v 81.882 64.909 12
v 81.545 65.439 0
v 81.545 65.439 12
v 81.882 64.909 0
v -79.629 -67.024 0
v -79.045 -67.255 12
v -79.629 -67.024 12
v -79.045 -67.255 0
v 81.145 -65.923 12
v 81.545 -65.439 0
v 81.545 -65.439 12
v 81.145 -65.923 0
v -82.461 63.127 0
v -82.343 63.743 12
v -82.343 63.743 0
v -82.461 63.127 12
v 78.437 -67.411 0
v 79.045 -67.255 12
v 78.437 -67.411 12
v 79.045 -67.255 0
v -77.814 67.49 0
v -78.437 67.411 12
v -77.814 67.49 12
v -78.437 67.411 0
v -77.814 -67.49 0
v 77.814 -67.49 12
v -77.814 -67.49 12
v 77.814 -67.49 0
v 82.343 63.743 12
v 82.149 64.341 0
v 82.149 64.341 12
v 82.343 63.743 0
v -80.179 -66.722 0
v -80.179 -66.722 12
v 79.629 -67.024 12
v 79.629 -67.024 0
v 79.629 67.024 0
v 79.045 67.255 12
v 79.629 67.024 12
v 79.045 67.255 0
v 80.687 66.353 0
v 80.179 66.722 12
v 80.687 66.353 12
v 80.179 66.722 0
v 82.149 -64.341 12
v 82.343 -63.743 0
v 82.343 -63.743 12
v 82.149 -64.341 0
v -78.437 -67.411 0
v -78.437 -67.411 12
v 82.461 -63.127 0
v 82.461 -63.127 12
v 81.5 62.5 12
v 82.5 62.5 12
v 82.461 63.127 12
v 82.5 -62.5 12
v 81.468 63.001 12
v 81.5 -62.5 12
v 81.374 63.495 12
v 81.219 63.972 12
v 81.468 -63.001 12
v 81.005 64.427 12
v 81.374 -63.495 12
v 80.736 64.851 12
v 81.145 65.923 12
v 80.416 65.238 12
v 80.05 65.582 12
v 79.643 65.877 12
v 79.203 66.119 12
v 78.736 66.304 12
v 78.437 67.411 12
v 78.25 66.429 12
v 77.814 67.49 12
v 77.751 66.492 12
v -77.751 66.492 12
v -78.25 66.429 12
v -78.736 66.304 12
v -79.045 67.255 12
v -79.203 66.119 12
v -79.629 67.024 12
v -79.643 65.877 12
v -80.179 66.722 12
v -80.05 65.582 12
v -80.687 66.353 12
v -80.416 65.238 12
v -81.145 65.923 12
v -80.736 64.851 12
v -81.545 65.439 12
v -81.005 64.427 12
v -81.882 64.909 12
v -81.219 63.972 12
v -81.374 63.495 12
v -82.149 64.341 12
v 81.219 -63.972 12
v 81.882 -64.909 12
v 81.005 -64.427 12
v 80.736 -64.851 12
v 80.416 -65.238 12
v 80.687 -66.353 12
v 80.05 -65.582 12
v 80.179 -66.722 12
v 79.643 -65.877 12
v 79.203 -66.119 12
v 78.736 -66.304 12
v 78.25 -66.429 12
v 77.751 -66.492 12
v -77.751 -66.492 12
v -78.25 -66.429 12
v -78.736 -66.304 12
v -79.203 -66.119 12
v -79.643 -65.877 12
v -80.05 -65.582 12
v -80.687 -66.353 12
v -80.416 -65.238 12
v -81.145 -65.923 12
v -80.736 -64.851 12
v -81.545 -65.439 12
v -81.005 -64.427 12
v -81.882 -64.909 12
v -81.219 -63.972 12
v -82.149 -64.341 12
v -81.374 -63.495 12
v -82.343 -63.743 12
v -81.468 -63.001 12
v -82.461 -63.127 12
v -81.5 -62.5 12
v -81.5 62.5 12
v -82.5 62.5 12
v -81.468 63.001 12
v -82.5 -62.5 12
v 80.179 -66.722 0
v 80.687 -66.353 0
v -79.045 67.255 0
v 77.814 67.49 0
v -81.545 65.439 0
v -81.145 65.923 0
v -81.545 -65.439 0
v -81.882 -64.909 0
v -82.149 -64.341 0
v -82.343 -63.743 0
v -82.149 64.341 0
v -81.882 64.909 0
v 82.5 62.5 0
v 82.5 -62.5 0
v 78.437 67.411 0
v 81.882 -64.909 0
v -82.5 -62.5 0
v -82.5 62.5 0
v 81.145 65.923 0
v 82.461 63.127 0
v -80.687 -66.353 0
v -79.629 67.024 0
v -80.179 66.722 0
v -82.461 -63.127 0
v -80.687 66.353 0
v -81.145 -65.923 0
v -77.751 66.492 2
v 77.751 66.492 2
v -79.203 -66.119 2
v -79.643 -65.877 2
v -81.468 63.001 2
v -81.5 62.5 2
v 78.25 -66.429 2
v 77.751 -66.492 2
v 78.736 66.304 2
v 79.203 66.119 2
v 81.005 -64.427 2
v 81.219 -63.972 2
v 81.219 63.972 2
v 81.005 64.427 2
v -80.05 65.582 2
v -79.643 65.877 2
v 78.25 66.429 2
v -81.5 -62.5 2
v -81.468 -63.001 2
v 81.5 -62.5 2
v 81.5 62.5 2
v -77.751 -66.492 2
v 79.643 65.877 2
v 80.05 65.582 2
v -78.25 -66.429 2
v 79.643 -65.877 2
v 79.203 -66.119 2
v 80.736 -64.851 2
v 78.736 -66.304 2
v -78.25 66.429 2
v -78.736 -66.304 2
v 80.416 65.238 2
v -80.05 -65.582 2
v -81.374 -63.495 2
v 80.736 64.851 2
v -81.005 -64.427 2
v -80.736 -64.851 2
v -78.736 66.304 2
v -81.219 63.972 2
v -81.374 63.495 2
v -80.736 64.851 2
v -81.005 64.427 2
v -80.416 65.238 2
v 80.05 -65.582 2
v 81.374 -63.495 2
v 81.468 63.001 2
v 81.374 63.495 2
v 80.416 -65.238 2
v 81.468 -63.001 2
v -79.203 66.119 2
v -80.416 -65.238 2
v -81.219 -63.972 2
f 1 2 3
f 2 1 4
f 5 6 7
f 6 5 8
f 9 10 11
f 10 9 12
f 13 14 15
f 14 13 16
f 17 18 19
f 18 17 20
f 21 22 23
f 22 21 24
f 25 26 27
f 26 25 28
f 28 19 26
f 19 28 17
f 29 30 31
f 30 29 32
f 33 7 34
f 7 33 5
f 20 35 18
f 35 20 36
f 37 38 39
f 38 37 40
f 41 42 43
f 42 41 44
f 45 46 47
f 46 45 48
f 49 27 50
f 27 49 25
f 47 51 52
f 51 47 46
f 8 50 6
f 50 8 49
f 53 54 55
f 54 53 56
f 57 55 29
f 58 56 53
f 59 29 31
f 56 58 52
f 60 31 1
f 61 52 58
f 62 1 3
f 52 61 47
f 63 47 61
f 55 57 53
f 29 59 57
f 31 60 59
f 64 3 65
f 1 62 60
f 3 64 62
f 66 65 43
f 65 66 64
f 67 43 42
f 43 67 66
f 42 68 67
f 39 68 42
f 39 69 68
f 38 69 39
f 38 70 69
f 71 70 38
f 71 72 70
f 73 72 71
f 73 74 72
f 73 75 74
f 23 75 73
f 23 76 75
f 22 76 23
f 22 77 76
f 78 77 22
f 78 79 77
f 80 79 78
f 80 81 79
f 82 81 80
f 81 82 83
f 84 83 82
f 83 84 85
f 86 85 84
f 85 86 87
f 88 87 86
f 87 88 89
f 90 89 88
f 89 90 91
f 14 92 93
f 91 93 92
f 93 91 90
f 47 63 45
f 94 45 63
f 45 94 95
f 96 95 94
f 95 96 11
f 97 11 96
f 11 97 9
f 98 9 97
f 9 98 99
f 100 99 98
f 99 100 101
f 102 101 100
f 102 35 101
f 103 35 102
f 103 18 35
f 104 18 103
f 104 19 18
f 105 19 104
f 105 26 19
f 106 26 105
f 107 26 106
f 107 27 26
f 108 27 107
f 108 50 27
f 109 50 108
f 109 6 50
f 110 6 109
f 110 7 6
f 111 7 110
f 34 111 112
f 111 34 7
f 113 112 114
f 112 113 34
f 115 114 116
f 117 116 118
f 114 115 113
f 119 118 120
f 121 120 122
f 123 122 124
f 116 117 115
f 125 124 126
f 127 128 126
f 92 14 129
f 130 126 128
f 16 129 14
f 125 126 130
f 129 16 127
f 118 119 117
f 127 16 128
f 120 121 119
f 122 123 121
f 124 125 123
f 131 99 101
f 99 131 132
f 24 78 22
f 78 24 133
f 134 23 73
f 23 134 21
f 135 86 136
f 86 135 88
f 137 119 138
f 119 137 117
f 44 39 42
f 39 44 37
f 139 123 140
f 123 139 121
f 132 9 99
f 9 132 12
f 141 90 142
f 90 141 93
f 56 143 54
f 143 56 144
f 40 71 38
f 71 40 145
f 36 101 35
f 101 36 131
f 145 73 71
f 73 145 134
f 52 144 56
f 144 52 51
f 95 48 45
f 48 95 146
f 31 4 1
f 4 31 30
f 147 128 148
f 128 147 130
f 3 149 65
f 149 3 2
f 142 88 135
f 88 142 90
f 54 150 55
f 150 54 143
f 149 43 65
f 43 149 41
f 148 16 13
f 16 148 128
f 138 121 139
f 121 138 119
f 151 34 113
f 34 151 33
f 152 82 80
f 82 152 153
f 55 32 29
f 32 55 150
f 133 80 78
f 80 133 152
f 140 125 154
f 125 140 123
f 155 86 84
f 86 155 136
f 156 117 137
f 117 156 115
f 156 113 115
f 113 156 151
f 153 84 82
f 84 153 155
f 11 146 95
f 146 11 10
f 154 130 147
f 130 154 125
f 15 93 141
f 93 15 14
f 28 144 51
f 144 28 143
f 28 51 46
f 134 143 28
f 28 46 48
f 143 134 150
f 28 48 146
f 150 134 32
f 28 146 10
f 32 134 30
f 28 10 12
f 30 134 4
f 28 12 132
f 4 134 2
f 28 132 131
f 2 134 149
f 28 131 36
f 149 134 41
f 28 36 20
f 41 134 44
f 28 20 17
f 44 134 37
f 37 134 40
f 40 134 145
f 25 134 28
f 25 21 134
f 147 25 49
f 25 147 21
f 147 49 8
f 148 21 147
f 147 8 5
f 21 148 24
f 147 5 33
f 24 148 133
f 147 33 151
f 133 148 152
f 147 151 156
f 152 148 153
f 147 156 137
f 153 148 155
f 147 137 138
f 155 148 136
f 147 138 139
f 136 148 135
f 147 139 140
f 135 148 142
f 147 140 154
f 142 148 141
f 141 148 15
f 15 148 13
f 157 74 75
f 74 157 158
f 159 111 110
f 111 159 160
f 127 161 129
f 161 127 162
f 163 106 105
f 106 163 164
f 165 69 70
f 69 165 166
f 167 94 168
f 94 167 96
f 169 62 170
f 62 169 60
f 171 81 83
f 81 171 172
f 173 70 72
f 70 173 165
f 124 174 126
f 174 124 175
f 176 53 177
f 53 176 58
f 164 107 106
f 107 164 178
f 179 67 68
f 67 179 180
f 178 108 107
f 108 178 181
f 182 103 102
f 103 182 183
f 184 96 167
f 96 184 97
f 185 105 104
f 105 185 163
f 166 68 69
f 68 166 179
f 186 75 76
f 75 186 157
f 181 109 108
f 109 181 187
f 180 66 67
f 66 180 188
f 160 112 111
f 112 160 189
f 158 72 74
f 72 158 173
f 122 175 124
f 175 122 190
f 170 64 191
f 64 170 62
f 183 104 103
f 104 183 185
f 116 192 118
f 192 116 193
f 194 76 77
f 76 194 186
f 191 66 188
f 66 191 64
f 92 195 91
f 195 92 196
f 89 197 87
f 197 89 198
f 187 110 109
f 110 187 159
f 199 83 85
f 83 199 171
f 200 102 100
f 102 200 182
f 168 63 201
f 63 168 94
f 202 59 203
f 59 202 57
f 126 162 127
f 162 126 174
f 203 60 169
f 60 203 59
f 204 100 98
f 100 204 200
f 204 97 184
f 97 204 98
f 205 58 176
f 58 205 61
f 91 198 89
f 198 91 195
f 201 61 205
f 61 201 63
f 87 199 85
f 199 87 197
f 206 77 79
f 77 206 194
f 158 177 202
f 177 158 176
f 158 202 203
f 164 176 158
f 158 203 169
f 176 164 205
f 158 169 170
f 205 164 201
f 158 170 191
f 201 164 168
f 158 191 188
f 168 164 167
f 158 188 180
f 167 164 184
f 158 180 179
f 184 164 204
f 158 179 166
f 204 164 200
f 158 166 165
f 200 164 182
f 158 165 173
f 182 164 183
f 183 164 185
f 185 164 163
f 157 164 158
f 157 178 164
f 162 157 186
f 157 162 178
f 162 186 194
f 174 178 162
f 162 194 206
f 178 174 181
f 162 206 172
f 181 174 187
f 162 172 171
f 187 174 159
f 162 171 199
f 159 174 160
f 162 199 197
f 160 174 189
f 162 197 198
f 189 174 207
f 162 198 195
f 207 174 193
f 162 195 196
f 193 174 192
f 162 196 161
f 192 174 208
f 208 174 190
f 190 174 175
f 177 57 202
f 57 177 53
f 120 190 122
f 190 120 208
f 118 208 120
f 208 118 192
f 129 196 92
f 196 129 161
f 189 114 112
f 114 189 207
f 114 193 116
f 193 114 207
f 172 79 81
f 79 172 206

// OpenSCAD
$fn = 50;


difference() {
	union() {
		hull() {
			translate(v = [-77.5000000000, 62.5000000000, 0]) {
				cylinder(h = 12, r = 5);
			}
			translate(v = [77.5000000000, 62.5000000000, 0]) {
				cylinder(h = 12, r = 5);
			}
			translate(v = [-77.5000000000, -62.5000000000, 0]) {
				cylinder(h = 12, r = 5);
			}
			translate(v = [77.5000000000, -62.5000000000, 0]) {
				cylinder(h = 12, r = 5);
			}
		}
	}
	union() {
		translate(v = [0, 0, 2]) {
			hull() {
				translate(v = [-77.5000000000, 62.5000000000, 0]) {
					cylinder(h = 10, r = 4);
				}
				translate(v = [77.5000000000, 62.5000000000, 0]) {
					cylinder(h = 10, r = 4);
				}
				translate(v = [-77.5000000000, -62.5000000000, 0]) {
					cylinder(h = 10, r = 4);
				}
				translate(v = [77.5000000000, -62.5000000000, 0]) {
					cylinder(h = 10, r = 4);
				}
			}
		}
	}
}
